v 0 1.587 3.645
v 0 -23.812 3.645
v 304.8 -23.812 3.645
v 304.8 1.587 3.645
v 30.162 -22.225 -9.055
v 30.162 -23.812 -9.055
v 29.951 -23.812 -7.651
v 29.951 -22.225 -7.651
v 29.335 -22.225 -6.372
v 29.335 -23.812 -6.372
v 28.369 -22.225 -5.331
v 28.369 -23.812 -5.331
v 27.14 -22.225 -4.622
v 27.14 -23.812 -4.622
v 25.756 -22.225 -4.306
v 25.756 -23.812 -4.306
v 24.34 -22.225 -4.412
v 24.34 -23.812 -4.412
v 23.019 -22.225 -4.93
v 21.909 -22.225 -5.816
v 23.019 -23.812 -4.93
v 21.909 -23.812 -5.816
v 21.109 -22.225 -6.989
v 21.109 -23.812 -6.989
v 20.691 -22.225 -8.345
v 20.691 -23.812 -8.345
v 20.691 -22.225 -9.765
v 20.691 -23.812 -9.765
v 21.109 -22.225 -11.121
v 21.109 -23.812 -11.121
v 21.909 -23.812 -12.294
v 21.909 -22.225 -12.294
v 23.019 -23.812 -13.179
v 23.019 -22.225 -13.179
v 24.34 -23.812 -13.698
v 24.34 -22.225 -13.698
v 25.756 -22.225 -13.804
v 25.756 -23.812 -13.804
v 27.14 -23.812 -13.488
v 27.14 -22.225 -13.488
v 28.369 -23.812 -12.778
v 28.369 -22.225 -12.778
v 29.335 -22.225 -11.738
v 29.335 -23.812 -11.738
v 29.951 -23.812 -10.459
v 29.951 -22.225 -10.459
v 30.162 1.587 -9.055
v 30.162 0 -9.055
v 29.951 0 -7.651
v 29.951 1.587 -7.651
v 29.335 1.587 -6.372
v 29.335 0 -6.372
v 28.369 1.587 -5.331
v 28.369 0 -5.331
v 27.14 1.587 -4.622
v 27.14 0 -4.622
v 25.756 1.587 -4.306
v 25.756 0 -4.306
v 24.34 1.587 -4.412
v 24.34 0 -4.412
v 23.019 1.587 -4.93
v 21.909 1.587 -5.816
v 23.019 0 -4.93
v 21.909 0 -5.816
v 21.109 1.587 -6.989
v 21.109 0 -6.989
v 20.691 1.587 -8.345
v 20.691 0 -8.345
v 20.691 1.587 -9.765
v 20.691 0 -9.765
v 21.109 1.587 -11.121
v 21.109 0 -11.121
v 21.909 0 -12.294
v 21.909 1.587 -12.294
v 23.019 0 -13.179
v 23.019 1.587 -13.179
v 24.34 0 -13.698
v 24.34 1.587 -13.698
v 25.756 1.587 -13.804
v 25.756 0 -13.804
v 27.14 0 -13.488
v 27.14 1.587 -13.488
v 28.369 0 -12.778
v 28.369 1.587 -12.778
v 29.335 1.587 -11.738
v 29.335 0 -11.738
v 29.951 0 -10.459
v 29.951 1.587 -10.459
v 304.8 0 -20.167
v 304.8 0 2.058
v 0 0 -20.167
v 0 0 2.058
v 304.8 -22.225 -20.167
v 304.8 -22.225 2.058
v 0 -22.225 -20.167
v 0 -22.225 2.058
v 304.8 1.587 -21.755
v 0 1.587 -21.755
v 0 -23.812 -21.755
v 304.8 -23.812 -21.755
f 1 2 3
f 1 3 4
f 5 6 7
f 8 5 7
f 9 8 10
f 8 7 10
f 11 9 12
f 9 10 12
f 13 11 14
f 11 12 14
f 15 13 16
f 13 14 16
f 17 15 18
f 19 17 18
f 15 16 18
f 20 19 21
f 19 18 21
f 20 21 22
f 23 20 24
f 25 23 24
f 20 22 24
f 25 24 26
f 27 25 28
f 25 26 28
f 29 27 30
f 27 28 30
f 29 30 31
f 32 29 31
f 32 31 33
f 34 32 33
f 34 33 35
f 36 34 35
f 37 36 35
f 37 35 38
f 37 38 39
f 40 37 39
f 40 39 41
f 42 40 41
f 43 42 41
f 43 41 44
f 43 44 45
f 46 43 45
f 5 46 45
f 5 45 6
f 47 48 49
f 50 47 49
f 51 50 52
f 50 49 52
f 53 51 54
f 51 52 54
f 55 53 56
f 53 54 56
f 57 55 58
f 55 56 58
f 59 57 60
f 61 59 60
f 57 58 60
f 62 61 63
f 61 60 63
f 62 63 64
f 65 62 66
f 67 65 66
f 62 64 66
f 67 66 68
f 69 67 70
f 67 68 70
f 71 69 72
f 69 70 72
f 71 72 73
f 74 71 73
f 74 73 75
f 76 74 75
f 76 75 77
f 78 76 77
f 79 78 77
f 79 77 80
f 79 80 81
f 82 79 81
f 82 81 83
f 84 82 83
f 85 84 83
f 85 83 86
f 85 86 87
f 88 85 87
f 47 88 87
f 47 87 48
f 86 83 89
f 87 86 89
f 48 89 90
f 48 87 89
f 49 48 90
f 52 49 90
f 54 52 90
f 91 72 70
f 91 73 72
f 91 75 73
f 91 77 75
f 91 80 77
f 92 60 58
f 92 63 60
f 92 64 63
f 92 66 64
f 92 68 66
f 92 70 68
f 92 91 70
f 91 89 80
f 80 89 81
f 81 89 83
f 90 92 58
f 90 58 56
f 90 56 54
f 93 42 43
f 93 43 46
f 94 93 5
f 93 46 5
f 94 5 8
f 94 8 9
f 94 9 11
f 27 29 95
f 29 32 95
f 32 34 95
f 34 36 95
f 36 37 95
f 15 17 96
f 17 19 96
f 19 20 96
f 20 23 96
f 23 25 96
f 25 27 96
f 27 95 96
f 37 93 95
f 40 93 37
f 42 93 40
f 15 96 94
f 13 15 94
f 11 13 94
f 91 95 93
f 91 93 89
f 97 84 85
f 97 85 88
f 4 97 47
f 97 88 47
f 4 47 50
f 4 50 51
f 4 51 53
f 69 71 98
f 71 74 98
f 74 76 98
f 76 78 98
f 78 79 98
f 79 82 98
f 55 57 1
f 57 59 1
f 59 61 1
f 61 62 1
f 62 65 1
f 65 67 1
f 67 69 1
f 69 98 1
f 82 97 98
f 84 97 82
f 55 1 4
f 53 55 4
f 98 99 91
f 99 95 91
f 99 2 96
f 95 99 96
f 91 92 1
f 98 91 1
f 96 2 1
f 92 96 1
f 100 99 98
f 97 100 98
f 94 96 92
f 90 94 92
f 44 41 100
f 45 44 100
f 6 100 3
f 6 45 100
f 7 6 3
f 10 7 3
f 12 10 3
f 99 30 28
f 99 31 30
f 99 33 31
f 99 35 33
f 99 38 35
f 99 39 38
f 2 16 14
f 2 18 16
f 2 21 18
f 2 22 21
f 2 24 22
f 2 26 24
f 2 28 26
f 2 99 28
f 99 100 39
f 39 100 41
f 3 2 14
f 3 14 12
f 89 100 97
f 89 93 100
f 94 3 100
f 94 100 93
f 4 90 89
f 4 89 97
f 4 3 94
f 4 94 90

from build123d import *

# Parameters (mm, degrees)
F0_W     = 25.4
F0_H     = 25.4
F0_W_2   = 22.225
F0_H_2   = 22.225
F1_DEPTH = 304.8
F2_R     = 4.7625
F3_DEPTH = 25.4


with BuildPart() as f1:
    # F0 (on Right) → F1 (new body)
    with BuildSketch(Plane.YZ):
        with Locations((-11.1125, -9.054881)):
            Rectangle(F0_W, F0_H)
        with Locations((-11.1125, -9.054881)):
            Rectangle(F0_W_2, F0_H_2, mode=Mode.SUBTRACT)
    extrude(amount=F1_DEPTH)

    # F2 (on face) → F3 (cut)
    with BuildSketch(Plane.XZ.offset(23.8125)):
        with Locations((25.4, -9.054881)):
            Circle(F2_R)
    extrude(amount=-F3_DEPTH, mode=Mode.SUBTRACT)


solid = f1.part
